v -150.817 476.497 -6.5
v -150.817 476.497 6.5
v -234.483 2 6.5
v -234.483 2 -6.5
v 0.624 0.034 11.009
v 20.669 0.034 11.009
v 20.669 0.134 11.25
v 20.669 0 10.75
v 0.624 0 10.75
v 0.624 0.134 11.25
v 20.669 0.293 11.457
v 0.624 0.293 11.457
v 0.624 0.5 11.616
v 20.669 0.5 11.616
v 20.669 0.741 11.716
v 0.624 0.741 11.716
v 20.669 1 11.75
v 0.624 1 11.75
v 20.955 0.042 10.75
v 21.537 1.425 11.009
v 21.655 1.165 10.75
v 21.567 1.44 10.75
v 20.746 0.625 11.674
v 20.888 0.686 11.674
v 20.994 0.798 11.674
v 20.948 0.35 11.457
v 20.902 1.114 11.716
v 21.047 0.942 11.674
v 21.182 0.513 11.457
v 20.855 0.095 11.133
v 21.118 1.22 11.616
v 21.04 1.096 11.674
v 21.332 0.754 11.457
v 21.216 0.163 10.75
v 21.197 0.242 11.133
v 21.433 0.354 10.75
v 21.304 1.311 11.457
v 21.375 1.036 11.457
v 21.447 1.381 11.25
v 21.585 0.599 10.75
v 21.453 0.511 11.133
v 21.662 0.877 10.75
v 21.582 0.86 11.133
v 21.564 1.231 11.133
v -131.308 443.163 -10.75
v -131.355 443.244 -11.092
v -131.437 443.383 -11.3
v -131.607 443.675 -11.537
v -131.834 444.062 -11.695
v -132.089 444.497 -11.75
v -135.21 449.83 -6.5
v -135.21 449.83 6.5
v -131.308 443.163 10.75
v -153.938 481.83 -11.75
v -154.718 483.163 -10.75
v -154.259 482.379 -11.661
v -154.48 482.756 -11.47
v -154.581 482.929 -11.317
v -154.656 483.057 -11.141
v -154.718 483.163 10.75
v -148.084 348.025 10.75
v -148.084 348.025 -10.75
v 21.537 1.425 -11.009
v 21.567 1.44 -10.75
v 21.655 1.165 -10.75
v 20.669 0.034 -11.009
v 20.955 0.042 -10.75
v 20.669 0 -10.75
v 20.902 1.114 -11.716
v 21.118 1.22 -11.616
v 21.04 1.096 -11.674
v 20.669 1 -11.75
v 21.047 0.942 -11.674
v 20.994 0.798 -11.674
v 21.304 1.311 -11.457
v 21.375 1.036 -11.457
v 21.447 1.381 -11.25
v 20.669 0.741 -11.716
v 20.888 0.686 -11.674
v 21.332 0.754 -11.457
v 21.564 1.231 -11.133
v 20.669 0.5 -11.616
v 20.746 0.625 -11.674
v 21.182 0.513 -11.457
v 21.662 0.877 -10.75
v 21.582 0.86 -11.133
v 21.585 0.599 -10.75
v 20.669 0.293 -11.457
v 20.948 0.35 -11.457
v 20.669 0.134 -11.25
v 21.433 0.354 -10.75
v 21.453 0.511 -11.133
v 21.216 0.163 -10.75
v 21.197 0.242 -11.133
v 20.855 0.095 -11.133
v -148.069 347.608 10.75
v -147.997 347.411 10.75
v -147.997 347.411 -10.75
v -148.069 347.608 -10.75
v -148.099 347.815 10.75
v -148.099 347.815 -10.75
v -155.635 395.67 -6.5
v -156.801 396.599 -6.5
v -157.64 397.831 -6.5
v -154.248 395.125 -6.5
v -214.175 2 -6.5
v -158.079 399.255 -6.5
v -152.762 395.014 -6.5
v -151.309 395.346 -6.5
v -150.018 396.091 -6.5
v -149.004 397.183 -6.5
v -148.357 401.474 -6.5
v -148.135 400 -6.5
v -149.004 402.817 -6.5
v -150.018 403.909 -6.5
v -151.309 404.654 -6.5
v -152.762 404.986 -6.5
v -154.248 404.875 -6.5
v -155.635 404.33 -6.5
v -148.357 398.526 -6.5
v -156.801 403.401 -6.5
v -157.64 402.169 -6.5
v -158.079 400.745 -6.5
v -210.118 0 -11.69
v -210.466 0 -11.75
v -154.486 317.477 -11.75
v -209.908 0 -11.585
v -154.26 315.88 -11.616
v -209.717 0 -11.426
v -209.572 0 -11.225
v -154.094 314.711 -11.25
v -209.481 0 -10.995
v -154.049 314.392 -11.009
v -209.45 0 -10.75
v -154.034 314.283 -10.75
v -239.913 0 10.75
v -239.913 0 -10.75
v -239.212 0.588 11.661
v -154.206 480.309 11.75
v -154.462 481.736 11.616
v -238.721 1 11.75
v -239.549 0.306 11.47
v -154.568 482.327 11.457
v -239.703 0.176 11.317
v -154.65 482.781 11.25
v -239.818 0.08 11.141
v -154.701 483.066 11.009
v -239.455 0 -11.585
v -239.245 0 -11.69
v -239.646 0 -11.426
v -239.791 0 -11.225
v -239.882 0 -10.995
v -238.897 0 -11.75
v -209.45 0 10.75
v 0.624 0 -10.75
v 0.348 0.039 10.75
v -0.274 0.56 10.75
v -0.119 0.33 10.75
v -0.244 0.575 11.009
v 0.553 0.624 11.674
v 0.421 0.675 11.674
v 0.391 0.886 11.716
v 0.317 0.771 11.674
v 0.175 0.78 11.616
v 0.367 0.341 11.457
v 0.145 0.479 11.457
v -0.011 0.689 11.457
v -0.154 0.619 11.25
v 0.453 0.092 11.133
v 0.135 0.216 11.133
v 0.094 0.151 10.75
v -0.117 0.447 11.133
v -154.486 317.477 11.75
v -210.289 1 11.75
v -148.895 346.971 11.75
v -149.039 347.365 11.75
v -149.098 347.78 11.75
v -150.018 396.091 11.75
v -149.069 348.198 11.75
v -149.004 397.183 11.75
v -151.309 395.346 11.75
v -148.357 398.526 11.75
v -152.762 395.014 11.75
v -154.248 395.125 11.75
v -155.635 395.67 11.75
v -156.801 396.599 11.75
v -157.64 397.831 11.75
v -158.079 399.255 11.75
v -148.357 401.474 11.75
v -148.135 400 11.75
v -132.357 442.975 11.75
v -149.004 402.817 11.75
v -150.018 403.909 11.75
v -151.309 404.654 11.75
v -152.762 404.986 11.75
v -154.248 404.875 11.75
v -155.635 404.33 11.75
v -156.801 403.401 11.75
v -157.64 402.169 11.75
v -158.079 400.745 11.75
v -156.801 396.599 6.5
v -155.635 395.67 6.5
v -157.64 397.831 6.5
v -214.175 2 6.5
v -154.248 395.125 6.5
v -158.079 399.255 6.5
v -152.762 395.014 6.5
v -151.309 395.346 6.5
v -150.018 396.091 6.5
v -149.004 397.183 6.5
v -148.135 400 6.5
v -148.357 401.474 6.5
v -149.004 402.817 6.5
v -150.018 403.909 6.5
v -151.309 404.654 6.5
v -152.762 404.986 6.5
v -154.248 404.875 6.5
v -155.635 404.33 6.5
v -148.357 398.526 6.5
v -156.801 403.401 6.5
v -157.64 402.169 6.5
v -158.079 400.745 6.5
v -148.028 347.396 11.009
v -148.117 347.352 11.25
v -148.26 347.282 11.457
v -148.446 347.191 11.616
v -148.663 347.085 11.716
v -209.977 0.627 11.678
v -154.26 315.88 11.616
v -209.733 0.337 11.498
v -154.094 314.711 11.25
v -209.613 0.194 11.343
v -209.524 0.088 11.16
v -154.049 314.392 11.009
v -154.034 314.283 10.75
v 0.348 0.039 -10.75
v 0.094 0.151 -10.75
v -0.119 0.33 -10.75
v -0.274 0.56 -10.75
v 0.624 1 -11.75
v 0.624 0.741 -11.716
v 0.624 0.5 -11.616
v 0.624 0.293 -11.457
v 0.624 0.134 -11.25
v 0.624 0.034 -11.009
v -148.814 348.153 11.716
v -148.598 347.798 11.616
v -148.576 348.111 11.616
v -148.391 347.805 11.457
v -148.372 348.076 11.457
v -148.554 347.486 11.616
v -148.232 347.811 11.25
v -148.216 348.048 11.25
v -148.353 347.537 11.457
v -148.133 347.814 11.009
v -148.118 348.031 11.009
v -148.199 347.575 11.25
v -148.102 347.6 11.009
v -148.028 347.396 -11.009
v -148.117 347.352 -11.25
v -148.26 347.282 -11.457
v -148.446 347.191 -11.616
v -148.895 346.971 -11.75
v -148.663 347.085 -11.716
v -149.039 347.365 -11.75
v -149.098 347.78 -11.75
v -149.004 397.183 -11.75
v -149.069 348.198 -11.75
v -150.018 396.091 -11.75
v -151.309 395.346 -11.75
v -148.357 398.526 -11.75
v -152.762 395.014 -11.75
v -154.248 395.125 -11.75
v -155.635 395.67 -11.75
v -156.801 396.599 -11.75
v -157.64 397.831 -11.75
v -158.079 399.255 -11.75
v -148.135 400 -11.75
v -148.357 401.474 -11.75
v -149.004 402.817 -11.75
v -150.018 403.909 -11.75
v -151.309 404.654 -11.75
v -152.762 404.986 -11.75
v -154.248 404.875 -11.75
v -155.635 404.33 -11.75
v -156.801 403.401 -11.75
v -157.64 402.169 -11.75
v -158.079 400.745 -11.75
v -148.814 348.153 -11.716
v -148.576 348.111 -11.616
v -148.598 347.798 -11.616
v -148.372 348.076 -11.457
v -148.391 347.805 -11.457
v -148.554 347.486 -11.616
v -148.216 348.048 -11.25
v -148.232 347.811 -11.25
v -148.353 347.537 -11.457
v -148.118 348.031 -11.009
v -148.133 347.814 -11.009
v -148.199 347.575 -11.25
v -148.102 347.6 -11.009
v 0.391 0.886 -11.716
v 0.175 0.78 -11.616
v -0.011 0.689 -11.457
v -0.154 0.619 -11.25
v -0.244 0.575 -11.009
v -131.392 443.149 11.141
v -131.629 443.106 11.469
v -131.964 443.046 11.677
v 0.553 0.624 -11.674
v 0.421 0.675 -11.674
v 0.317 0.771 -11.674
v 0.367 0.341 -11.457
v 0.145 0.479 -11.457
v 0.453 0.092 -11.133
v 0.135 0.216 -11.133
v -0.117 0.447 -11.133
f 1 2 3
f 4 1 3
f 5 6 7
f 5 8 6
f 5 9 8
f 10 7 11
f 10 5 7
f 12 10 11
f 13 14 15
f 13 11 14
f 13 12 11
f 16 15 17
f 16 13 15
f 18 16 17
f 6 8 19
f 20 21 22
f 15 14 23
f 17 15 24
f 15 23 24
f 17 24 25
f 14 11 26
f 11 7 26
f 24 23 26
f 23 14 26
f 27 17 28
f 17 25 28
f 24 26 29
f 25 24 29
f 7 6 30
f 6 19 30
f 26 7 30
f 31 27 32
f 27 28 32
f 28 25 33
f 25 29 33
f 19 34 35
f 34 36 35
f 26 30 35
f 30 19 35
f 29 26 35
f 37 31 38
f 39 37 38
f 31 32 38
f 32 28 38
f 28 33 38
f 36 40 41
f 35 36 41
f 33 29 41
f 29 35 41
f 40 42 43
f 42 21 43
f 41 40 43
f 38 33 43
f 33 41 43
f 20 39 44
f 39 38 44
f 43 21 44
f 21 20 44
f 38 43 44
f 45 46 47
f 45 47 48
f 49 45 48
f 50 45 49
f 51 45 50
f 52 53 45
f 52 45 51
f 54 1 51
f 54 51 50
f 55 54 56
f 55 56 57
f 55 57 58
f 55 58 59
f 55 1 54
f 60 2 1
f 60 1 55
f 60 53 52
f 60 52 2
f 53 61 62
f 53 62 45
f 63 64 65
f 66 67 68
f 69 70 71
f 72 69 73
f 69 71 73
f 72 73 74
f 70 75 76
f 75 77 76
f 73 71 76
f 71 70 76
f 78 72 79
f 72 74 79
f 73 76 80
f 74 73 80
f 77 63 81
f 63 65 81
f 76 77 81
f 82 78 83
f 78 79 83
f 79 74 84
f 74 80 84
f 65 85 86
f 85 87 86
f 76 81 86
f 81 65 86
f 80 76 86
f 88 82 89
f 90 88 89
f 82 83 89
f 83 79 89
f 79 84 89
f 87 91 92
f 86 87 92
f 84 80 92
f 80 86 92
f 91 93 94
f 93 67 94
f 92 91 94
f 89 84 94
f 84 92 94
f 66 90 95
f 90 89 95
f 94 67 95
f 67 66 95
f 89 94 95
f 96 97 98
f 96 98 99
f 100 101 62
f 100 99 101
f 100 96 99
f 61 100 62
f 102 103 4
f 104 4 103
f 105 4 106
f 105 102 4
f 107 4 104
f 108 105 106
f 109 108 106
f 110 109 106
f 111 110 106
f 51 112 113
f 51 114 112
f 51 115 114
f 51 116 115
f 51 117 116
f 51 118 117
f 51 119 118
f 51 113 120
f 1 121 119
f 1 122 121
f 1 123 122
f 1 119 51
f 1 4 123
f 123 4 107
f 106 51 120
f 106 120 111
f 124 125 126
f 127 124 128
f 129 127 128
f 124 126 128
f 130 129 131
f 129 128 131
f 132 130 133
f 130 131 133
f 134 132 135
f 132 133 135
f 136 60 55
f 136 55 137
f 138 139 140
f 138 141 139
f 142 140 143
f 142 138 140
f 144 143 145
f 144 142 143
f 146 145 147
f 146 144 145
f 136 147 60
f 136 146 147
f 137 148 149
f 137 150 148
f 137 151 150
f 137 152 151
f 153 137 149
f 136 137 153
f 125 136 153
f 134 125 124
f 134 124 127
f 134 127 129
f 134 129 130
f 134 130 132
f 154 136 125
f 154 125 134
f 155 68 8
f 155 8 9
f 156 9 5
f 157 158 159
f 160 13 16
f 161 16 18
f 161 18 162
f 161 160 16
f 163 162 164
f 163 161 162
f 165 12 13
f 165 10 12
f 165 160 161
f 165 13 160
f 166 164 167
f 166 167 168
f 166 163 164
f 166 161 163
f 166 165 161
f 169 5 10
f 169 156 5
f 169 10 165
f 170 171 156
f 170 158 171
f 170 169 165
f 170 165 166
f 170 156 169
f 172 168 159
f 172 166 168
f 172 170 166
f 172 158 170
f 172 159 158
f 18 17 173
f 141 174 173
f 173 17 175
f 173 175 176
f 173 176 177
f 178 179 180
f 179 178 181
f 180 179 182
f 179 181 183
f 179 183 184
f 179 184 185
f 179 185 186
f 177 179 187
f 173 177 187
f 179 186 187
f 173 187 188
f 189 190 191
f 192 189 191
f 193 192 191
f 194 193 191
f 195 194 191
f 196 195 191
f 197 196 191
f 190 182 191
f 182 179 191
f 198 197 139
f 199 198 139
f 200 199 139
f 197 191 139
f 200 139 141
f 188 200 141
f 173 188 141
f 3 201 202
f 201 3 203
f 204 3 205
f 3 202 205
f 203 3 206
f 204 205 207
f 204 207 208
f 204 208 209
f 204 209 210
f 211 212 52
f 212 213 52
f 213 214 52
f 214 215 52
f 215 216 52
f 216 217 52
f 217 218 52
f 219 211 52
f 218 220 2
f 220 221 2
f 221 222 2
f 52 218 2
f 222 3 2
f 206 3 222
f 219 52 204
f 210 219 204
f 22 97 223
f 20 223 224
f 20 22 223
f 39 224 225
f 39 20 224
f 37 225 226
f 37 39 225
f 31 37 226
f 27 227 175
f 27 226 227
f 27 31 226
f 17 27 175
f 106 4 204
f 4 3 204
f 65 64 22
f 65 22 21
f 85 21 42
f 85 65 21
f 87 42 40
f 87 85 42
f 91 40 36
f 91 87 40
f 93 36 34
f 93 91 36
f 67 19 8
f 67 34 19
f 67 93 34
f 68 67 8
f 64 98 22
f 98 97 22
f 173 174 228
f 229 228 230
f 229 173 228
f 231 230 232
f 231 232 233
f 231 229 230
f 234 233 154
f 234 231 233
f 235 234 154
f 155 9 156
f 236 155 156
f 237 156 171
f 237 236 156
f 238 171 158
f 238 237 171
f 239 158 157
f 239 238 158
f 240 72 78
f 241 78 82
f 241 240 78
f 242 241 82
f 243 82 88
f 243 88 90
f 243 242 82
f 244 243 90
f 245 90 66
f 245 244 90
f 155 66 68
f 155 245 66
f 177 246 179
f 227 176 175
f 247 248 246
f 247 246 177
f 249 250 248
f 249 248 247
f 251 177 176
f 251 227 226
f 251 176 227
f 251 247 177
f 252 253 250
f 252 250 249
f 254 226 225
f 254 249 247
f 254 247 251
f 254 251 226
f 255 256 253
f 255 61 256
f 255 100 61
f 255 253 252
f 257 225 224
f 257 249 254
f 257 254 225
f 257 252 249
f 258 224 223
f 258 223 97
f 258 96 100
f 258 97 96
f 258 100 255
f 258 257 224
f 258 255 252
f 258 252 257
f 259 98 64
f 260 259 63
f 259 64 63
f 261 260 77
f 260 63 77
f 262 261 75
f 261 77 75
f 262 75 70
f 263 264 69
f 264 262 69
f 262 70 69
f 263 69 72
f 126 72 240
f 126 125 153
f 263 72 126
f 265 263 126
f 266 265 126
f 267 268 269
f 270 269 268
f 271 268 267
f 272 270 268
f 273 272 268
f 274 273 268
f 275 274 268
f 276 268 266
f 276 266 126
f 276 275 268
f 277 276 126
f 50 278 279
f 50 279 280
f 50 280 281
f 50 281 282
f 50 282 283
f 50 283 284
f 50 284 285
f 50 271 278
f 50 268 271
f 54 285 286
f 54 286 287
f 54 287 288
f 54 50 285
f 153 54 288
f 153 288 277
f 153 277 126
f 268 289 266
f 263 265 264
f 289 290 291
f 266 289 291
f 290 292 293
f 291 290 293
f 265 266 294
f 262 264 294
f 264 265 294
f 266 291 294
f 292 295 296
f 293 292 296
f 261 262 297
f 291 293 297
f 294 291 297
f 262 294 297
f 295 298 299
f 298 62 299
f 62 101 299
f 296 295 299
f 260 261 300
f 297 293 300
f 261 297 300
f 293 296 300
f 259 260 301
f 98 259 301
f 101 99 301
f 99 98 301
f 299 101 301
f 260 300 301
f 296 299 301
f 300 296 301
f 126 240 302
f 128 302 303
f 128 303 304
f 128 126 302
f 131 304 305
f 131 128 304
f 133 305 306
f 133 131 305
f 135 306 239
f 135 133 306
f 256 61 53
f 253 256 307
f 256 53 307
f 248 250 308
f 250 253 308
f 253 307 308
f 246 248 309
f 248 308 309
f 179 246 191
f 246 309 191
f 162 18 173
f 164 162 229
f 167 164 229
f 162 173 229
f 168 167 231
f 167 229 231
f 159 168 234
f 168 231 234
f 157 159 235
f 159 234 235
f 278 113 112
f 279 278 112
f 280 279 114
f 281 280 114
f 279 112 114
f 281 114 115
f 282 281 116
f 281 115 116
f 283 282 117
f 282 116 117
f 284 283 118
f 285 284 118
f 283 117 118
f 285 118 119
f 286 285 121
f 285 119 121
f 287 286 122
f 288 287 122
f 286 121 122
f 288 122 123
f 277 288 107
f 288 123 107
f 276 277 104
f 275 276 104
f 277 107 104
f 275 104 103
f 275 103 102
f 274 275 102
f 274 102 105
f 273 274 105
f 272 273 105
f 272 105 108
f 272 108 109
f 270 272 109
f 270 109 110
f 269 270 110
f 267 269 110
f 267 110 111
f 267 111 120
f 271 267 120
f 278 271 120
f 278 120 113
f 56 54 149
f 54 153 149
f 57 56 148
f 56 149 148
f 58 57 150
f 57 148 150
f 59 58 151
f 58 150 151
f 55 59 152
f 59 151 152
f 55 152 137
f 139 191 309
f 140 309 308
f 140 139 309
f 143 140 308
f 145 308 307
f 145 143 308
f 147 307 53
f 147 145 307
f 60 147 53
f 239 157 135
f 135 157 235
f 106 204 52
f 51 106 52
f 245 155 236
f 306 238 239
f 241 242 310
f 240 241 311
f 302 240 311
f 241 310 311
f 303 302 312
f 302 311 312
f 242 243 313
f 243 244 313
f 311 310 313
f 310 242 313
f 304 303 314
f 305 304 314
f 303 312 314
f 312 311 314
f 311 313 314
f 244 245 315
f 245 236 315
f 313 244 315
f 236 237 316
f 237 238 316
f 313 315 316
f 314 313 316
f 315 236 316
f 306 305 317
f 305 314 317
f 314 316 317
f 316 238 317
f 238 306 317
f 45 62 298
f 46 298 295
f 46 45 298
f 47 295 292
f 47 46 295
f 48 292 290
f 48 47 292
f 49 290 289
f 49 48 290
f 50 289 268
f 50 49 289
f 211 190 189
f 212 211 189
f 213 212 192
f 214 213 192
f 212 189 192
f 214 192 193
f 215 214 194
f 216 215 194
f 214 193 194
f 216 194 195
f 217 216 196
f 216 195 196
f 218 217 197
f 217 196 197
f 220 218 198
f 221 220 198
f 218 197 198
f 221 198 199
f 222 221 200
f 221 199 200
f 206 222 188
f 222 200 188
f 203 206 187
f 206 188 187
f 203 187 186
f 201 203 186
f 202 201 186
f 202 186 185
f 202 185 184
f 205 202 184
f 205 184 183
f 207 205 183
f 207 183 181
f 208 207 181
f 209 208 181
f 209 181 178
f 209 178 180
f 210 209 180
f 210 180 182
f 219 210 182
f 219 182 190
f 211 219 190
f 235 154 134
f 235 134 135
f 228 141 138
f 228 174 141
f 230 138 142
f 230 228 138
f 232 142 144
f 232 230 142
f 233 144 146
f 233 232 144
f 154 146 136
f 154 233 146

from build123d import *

# Parameters (mm, degrees)
BOSS_EXTRUDE2_DEPTH = 11.75
CUT_EXTRUDE1_DEPTH  = 6.5
SKETCH3_R           = 5
CUT_EXTRUDE2_DEPTH  = 540.96055804
FILLET2_R           = 1


with BuildPart() as part:
    # Sketch1 → Boss-Extrude2 (new, symmetric)
    with BuildSketch(Plane.XY):
        Polygon((-154.033564487, 314.282772375), (-148.14056714, 347.703621092), (22.272935761, 0), (0, 0), align=None)
        Polygon((-154.718136007, 483.163488855), (-239.912895185, 0), (-209.450096828, 0), (-131.308416878, 443.163488855), align=None)
    extrude(amount=BOSS_EXTRUDE2_DEPTH, both=True)

    # Sketch2 → Cut-Extrude1 (cut, symmetric)
    with BuildSketch(Plane.XY):
        Polygon((-234.483108164, 2), (-214.174575926, 2), (-126.011085572, 502), (-139.266538582, 542), align=None)
    extrude(amount=CUT_EXTRUDE1_DEPTH, both=True, mode=Mode.SUBTRACT)

    # Sketch3 → Cut-Extrude2 (cut, through all)
    with BuildSketch(Plane.XY.offset(11.75)):
        with Locations((-153.135277111, 400)):
            Circle(SKETCH3_R)
    extrude(amount=-CUT_EXTRUDE2_DEPTH, mode=Mode.SUBTRACT)

    # Fillet2
    fillet2_edges = [part.edges().sort_by_distance(p)[0] for p in [
        (-62.933815689, 173.851810546, -11.75),
        (11.136467881, 0, 11.75),
        (-77.016782243, 157.141386187, 11.75),
        (-181.741830658, 157.141386187, 11.75),
        (-224.681496007, 0, 11.75),
        (-197.315515596, 241.581744428, 11.75),
        (-143.013276442, 463.163488855, 11.75),
        (-139.724492009, 395.433554974, 11.75),
        (-62.933815689, 173.851810546, 11.75),
        (11.136467881, 0, -11.75),
        (-77.016782243, 157.141386187, -11.75),
        (0, 0, 0),
        (22.272935761, 0, 0),
        (-148.14056714, 347.703621092, 0),
        (-181.741830658, 157.141386187, -11.75),
        (-197.315515596, 241.581744428, -11.75),
        (-139.724492009, 395.433554974, -11.75),
    ]]
    fillet(fillet2_edges, radius=FILLET2_R)


solid = part.part
